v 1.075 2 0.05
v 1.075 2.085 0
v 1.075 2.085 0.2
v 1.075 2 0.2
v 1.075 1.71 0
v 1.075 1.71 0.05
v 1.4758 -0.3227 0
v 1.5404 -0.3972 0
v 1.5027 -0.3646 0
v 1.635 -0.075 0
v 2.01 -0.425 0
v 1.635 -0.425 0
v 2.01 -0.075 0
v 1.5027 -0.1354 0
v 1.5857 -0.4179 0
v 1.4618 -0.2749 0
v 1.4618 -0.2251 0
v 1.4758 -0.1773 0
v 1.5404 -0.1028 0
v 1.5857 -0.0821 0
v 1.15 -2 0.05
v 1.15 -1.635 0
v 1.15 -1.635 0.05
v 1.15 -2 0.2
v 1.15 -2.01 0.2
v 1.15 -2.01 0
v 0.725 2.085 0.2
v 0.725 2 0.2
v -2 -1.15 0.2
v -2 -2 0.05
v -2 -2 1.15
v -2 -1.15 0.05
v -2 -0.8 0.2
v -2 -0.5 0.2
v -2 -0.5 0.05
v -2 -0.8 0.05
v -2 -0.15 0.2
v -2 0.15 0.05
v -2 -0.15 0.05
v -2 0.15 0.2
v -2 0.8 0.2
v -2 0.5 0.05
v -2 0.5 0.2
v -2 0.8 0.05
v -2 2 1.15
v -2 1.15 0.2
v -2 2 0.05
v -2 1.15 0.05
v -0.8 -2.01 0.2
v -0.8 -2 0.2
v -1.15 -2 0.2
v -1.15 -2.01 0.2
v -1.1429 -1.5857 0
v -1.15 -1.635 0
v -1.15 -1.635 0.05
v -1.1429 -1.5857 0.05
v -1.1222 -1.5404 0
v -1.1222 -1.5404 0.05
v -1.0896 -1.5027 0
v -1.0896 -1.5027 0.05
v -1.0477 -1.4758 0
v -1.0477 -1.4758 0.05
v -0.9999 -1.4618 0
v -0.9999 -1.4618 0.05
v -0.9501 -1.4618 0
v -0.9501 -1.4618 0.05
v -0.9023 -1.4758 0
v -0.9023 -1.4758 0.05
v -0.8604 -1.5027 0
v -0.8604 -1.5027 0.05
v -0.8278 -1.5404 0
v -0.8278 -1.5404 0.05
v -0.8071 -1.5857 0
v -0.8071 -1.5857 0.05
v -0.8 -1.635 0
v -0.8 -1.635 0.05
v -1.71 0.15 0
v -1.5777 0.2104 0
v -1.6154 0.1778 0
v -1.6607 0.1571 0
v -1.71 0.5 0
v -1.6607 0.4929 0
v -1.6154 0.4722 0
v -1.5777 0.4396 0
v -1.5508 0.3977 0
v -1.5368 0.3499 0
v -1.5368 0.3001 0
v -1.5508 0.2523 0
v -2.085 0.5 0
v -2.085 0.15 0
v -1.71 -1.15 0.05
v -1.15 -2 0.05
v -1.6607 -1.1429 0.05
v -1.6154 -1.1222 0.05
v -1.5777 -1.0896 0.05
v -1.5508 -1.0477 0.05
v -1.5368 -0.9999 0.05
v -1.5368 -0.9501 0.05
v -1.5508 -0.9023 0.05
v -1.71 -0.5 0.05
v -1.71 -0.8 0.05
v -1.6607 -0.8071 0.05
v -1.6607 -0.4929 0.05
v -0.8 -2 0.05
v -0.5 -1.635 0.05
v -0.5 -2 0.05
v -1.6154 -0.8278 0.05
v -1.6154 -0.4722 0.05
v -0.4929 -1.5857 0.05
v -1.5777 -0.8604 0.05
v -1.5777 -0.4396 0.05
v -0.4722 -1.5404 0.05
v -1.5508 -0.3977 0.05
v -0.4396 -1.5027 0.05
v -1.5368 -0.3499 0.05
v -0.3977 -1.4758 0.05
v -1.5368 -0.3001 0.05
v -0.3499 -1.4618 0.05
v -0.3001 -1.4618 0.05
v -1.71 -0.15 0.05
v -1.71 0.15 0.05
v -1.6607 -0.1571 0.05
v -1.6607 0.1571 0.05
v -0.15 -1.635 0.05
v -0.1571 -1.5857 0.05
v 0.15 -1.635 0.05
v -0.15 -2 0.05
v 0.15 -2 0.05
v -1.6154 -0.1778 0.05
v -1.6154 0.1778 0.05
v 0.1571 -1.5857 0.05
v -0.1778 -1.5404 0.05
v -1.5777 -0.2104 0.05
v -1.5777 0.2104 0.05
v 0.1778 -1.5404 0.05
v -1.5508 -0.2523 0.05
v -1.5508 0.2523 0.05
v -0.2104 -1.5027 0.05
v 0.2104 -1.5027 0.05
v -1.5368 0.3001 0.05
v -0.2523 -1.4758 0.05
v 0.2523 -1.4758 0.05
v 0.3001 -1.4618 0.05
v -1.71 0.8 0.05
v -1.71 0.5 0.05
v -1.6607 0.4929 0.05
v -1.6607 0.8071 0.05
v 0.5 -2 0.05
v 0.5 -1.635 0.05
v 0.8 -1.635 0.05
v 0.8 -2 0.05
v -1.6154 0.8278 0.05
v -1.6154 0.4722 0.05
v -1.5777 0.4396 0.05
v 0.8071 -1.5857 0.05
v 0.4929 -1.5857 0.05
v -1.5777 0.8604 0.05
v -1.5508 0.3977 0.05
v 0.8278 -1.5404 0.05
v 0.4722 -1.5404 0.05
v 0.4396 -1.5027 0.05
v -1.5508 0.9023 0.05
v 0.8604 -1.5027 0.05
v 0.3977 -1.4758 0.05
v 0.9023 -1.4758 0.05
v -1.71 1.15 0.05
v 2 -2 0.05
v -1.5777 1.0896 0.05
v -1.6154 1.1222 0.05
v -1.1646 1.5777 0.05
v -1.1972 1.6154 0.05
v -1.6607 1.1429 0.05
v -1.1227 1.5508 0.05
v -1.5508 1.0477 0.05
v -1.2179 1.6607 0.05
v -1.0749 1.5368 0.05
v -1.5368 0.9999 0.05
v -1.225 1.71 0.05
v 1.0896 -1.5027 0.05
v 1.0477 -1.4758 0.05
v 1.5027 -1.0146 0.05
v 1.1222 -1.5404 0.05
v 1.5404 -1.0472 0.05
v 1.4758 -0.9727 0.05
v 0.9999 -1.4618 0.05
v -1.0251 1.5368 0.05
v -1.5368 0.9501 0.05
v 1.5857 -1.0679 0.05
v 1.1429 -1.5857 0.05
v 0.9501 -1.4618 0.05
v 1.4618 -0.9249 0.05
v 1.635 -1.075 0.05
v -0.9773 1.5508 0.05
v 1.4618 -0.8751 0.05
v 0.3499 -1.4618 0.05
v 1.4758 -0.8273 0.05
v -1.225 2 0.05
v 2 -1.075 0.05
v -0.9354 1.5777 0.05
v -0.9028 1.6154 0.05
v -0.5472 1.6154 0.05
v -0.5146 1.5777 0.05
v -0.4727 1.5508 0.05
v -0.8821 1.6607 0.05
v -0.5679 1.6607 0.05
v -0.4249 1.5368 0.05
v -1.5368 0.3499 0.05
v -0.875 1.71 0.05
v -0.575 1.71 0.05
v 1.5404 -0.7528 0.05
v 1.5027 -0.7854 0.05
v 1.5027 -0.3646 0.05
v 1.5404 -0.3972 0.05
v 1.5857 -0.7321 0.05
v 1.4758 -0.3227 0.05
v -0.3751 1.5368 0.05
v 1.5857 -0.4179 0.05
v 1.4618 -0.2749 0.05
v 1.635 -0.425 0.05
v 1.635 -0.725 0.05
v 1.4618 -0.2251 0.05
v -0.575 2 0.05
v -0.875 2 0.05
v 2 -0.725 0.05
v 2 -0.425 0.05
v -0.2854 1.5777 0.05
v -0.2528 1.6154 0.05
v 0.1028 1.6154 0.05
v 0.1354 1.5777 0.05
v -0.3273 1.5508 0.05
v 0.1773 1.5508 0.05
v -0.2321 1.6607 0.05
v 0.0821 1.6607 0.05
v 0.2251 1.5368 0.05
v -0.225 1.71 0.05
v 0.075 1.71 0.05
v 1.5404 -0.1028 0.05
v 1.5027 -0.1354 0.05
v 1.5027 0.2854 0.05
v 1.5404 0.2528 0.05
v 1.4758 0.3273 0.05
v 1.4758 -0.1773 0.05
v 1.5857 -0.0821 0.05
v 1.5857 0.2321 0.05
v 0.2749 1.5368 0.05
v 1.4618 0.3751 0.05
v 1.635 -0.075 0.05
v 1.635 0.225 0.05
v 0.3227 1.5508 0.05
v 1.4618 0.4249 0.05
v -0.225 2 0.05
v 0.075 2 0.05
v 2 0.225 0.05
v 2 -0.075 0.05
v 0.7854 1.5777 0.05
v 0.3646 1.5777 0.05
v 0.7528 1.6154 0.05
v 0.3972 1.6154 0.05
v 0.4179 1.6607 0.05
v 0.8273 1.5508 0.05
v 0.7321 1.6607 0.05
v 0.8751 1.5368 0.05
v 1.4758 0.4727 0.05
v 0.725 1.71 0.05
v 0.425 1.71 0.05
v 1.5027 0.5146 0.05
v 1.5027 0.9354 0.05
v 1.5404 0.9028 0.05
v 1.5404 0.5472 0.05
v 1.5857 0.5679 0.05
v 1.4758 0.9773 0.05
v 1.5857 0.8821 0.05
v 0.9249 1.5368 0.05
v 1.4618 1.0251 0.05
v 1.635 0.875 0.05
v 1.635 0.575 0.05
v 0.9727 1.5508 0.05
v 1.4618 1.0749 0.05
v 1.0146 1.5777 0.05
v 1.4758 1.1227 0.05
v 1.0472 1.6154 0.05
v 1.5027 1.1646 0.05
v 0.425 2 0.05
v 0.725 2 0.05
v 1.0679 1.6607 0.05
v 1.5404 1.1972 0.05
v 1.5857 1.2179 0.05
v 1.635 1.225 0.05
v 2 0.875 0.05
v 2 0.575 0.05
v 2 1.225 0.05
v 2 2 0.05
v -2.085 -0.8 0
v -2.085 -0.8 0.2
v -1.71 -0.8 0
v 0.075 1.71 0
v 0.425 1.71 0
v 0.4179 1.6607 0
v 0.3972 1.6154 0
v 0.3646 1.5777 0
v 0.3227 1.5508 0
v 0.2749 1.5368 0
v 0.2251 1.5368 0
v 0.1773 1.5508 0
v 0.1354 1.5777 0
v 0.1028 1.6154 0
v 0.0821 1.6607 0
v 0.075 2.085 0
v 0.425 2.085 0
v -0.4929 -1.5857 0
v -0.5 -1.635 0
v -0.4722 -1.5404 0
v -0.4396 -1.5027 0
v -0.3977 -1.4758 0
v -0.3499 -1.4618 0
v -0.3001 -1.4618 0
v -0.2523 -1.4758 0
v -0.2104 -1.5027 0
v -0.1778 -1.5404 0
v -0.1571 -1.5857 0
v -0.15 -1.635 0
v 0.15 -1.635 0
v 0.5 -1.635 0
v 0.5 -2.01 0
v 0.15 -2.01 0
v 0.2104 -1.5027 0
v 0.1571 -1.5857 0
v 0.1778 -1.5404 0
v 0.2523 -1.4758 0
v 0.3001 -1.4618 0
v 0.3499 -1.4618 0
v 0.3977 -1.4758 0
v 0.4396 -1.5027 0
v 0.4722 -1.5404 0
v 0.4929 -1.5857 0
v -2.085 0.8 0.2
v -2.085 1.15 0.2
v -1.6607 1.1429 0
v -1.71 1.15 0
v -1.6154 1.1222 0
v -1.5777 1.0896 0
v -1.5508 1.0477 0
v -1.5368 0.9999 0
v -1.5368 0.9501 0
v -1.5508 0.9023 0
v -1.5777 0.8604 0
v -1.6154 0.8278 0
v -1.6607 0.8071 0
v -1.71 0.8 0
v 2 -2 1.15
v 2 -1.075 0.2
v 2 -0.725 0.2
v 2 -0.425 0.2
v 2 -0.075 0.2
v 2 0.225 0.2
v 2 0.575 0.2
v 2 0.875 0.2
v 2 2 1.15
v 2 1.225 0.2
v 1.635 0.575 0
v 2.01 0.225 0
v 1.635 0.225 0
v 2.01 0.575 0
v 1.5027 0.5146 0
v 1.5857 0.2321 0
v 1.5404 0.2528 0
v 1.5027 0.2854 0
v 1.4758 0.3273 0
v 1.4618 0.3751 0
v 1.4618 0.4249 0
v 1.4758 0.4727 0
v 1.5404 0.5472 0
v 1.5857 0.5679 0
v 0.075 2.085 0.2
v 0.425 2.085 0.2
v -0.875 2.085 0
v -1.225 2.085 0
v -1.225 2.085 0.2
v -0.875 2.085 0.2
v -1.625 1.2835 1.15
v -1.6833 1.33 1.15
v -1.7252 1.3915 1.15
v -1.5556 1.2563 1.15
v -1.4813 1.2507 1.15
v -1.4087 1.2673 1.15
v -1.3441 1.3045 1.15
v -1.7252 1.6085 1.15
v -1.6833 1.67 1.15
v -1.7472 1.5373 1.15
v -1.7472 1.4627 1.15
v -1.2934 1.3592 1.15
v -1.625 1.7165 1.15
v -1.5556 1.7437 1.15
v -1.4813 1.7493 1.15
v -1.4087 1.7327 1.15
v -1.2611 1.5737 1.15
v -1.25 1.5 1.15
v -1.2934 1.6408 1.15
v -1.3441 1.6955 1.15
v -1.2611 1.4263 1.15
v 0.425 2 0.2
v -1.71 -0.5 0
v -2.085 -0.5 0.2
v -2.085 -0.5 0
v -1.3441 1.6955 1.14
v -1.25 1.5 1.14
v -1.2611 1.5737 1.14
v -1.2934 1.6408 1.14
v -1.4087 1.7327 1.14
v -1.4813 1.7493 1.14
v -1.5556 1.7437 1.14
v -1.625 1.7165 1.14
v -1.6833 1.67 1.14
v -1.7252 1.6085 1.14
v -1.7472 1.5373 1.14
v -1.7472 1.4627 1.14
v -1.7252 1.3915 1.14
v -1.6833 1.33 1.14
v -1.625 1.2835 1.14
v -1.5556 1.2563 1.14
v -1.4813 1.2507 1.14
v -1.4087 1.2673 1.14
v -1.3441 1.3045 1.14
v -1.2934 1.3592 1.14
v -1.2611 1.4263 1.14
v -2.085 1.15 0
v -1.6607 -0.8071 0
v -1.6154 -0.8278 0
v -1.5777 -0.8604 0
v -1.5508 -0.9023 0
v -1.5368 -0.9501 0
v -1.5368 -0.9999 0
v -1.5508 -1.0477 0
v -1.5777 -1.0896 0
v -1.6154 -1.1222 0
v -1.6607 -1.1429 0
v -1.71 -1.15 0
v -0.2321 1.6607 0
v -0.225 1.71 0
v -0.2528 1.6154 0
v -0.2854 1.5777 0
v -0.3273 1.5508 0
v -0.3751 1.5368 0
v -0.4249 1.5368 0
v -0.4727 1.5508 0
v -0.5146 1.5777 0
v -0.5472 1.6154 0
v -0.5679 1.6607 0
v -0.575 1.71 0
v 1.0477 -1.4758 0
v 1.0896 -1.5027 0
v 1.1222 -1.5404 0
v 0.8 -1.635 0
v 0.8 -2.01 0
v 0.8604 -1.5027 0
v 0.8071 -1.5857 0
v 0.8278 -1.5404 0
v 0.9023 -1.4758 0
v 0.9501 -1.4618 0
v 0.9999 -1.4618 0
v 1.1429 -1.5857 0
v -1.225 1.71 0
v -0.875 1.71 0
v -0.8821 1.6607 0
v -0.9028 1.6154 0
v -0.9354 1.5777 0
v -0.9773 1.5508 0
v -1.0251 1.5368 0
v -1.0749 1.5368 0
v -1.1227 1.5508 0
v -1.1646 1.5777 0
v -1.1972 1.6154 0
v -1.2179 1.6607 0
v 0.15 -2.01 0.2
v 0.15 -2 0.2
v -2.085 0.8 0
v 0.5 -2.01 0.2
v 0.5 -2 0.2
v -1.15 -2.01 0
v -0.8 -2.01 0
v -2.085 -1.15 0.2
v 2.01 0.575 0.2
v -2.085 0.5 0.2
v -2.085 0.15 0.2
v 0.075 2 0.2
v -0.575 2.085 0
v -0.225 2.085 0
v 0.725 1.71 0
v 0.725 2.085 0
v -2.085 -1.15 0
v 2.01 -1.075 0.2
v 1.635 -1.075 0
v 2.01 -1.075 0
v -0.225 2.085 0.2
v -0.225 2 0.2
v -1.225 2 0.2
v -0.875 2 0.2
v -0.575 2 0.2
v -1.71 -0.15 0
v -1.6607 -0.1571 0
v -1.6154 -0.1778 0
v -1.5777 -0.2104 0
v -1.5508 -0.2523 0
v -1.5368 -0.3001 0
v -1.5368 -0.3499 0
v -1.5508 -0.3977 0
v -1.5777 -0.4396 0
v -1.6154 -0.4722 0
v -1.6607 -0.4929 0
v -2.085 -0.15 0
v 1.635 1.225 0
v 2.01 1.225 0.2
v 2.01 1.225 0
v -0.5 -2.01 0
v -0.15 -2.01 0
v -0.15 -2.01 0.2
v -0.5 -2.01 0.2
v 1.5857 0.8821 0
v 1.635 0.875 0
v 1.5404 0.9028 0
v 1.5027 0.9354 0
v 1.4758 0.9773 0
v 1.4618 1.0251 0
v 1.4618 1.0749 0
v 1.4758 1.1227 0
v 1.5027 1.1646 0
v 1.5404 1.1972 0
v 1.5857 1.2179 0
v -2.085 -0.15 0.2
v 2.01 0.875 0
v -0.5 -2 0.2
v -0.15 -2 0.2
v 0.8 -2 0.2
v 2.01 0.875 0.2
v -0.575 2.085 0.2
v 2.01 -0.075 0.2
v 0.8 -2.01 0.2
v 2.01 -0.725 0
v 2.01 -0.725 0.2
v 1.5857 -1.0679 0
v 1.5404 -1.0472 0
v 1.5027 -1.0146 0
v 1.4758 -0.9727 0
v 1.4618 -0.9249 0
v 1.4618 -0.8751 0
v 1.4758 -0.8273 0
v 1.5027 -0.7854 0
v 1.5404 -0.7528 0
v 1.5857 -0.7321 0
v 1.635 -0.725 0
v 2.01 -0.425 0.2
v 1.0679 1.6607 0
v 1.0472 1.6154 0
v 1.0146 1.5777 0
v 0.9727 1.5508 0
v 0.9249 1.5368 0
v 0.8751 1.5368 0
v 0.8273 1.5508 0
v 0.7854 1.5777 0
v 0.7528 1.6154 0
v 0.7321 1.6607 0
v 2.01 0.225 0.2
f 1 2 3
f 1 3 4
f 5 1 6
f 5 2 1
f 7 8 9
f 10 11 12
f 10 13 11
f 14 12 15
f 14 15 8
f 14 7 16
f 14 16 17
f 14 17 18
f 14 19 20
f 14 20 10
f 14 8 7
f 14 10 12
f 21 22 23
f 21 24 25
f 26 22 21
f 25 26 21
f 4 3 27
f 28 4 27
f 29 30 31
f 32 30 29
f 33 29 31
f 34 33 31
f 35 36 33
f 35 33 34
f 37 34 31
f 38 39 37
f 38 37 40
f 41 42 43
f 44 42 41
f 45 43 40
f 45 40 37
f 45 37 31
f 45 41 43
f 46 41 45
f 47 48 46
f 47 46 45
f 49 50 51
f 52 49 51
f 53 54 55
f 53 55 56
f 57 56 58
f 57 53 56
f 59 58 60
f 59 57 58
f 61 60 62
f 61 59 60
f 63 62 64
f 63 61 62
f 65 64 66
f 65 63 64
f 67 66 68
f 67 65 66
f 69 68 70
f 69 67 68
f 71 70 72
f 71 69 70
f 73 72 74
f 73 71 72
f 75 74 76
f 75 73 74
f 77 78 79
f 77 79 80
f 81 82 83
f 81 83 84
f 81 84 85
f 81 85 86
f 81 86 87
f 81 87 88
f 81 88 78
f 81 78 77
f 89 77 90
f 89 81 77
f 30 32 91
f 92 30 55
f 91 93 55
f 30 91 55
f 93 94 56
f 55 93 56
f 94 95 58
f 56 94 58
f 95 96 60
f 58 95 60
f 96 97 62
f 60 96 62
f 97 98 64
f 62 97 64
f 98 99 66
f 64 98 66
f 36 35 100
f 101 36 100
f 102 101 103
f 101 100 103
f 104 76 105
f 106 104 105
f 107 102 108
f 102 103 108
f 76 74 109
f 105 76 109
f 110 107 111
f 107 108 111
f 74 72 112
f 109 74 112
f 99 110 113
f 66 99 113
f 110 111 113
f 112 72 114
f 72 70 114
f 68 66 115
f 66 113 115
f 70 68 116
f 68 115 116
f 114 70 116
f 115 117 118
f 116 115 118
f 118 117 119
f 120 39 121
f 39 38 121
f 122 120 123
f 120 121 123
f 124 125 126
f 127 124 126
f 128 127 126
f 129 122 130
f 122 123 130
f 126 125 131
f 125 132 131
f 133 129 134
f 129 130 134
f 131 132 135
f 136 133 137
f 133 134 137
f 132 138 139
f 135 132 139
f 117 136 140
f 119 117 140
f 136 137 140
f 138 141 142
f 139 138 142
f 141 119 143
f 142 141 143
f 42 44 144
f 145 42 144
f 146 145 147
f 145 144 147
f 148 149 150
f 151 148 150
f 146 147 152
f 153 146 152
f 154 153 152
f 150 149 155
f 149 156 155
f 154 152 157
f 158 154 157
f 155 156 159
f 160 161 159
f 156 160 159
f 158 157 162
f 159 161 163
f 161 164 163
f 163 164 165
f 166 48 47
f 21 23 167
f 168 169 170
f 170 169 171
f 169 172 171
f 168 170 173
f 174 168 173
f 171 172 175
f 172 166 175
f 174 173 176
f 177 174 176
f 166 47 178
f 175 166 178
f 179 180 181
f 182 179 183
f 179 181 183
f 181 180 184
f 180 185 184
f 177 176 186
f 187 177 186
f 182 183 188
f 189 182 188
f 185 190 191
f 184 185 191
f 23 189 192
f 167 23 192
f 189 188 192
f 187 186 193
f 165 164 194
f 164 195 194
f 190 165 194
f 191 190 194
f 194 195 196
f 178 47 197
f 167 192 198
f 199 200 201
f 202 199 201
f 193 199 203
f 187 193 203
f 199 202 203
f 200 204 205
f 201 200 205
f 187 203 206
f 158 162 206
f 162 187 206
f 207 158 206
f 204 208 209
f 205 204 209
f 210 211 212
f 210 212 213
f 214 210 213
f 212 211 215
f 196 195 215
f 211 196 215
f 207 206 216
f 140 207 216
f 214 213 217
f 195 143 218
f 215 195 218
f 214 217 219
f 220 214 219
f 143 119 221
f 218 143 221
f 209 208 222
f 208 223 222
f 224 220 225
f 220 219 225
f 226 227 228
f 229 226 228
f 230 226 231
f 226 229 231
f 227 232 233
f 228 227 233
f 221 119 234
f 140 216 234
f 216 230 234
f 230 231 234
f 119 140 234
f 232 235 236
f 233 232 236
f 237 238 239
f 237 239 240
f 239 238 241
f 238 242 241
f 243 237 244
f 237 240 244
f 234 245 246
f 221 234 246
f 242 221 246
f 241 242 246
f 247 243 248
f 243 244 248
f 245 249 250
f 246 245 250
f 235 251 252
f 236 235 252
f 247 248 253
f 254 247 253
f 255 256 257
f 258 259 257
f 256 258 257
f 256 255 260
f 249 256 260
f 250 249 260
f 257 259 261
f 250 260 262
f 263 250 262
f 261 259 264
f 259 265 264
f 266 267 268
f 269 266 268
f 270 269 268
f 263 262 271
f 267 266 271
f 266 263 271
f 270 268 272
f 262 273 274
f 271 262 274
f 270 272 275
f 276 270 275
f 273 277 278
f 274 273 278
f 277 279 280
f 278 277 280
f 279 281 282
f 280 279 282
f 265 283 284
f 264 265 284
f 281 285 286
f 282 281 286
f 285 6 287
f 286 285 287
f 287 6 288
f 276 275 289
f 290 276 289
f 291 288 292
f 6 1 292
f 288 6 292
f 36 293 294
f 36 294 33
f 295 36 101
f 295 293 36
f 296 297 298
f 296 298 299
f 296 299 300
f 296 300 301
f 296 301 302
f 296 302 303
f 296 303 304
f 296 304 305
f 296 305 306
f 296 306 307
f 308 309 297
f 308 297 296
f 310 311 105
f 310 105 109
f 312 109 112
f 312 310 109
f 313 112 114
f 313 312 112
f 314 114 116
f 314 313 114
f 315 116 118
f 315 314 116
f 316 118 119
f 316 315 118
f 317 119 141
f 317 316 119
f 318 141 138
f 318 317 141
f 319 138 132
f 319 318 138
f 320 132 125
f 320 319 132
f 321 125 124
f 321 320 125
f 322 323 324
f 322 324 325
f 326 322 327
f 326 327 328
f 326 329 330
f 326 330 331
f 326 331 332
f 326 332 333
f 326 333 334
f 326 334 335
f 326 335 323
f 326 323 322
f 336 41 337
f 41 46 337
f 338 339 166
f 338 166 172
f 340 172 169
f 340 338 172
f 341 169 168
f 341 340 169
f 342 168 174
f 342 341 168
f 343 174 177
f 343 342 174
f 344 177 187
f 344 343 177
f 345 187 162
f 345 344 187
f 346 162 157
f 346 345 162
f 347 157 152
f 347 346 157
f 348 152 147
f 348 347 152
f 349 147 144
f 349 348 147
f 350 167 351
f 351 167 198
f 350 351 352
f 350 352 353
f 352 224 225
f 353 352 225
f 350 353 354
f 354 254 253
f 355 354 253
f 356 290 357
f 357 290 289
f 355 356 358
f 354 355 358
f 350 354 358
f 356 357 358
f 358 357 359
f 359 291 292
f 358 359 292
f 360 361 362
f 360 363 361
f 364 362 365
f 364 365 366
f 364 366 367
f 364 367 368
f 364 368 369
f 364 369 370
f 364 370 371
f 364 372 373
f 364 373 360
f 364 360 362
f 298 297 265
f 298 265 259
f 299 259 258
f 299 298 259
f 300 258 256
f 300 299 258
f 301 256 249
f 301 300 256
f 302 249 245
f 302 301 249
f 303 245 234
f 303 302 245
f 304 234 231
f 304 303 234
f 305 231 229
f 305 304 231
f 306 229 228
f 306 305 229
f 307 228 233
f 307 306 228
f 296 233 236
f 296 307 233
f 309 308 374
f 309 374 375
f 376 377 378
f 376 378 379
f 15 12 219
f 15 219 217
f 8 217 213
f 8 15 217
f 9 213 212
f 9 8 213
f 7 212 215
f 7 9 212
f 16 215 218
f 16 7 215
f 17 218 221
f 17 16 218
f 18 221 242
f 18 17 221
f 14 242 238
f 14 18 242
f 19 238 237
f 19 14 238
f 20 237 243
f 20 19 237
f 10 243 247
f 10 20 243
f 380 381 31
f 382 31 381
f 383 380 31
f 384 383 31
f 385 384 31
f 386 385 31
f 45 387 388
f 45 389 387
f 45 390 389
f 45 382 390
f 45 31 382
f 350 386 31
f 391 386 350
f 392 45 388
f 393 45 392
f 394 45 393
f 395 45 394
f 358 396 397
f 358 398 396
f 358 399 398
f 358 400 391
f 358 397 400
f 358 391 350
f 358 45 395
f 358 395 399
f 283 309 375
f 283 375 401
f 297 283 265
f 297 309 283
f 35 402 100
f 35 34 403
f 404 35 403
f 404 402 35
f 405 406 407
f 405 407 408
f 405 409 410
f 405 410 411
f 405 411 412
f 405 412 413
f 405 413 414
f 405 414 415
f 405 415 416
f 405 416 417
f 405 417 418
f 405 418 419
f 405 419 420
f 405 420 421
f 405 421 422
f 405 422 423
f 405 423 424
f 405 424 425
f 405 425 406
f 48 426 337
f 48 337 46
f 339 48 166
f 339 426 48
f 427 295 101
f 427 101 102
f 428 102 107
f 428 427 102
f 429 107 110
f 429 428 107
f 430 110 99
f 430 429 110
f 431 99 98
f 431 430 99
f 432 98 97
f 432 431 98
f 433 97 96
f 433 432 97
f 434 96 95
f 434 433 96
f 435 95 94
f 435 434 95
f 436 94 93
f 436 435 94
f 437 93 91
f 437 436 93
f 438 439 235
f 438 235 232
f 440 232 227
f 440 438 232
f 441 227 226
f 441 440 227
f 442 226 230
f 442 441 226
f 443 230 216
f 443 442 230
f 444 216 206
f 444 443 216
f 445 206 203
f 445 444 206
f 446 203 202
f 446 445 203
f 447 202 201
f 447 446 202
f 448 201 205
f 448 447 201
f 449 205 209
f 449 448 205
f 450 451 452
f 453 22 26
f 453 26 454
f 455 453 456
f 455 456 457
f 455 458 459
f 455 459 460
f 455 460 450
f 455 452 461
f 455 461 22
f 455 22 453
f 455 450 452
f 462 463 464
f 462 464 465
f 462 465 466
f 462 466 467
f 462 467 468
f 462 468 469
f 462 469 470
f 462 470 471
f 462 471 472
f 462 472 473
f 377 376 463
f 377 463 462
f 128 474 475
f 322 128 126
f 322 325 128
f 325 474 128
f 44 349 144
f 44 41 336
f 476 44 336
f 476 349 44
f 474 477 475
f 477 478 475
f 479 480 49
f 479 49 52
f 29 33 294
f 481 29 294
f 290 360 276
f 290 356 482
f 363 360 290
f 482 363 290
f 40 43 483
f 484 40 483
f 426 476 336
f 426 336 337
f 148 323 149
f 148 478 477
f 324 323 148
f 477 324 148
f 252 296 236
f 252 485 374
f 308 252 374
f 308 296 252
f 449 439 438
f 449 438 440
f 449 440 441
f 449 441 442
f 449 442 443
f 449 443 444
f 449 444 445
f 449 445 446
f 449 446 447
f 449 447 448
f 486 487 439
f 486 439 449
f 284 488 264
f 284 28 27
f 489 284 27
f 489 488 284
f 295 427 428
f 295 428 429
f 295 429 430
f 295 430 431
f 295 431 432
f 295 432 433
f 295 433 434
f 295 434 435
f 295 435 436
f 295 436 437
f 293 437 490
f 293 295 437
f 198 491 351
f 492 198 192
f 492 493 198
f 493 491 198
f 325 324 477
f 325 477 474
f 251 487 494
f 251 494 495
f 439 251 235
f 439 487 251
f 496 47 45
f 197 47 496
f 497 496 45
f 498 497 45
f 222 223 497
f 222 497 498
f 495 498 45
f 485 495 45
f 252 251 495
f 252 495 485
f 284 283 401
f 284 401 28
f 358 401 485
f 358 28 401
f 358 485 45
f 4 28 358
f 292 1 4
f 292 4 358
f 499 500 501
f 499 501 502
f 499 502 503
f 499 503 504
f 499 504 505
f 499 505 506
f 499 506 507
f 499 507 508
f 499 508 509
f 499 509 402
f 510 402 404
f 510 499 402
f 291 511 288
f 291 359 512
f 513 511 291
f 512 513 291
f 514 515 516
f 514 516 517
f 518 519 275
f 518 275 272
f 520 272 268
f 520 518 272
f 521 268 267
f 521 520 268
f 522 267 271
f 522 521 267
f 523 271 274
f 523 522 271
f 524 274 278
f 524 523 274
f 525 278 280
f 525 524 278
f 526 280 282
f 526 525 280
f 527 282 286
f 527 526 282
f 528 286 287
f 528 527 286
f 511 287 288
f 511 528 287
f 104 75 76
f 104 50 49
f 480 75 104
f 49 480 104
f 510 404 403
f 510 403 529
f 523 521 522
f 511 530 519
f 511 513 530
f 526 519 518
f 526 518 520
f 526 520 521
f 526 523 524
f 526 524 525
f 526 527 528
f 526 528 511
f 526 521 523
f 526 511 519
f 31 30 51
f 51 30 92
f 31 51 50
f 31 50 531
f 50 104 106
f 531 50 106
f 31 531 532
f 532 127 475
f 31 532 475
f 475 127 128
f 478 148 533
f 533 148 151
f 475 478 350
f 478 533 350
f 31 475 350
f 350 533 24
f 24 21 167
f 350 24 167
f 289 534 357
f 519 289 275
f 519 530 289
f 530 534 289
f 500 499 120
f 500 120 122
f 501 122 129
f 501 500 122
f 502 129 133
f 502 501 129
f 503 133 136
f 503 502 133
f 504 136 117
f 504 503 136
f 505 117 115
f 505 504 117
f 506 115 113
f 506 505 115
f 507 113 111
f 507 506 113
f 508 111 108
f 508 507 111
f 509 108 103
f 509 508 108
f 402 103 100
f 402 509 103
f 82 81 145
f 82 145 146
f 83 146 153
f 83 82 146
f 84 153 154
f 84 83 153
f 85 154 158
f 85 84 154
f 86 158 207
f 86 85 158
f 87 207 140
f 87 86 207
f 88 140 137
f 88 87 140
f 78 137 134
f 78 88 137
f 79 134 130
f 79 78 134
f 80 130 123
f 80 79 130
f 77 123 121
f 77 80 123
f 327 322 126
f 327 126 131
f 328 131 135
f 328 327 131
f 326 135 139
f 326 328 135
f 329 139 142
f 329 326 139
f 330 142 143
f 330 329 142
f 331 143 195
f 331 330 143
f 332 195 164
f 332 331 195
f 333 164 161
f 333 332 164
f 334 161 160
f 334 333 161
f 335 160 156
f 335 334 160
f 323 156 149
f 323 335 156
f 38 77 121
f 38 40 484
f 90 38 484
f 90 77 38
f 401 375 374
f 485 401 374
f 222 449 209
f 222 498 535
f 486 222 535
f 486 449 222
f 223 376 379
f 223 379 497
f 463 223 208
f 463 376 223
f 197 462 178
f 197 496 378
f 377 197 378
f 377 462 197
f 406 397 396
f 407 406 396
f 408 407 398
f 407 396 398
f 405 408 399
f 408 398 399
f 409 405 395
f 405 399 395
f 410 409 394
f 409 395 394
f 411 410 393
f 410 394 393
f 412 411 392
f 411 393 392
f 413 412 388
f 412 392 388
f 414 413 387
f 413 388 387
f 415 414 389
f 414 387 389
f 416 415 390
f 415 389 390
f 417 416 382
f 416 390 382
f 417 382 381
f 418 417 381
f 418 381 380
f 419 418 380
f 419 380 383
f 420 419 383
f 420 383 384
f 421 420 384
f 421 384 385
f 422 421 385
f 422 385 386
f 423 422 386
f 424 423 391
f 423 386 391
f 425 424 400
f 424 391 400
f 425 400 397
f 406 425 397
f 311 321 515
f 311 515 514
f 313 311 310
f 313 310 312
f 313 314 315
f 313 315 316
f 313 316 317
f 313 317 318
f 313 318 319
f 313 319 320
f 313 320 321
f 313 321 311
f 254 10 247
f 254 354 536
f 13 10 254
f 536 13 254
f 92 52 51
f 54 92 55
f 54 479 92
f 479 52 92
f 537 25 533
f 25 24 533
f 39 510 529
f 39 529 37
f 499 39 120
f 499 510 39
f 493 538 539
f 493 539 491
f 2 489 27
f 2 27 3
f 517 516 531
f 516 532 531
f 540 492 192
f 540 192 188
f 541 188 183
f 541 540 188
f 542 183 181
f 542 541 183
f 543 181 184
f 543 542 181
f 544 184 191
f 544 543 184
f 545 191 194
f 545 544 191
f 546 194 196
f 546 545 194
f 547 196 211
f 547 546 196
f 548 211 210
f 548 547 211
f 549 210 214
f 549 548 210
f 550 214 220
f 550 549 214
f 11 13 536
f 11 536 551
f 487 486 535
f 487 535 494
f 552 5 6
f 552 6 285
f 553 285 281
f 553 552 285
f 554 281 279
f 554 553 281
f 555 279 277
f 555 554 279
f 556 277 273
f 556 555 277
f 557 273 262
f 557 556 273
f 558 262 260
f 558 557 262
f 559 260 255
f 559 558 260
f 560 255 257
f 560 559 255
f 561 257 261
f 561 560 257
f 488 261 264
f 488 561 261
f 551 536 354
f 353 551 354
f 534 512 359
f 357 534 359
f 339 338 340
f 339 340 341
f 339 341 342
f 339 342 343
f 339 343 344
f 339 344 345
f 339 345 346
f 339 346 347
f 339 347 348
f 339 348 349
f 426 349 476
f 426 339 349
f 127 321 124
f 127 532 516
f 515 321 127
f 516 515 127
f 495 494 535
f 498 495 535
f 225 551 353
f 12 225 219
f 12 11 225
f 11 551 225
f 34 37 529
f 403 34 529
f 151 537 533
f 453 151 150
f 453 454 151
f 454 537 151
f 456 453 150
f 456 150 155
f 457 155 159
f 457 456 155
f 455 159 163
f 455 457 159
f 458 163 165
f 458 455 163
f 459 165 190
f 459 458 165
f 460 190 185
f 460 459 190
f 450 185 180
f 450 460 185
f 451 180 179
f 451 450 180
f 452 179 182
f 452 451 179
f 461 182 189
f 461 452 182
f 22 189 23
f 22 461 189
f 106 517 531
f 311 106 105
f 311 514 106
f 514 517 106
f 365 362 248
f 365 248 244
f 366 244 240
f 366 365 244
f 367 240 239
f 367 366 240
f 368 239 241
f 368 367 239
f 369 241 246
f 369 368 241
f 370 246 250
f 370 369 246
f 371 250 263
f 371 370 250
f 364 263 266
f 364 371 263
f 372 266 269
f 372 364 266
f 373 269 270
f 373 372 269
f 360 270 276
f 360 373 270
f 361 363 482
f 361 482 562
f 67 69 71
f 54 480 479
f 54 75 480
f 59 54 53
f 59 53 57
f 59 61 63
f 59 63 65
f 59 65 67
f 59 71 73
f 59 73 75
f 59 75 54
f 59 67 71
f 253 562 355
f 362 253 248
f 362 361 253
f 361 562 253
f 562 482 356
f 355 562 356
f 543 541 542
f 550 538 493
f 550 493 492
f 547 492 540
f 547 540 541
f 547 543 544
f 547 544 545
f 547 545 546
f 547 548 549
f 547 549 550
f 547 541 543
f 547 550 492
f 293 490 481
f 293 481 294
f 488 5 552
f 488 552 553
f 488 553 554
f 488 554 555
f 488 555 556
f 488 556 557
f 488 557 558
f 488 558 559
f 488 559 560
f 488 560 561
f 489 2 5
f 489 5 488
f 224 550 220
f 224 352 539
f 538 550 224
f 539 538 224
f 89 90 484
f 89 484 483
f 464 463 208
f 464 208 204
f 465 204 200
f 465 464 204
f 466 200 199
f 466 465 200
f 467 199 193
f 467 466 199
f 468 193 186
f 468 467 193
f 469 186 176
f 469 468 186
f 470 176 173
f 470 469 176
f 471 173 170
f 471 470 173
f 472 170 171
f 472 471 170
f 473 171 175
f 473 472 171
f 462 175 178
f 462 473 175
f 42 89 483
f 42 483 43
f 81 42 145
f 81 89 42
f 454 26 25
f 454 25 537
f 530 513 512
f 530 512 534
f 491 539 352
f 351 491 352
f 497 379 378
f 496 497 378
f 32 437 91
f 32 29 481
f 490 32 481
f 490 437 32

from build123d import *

# Parameters (mm, degrees)
ESBO_O1_W                = 4
ESBO_O1_H                = 4
RESSALTO_EXTRUS_O1_DEPTH = 1.1
RESSALTO_EXTRUS_O2_DEPTH = 0.2
ESBO_O3_R                = 0.25
CORTE_EXTRUS_O1_DEPTH    = 0.01


with BuildPart() as part:
    # Esboço1 → Ressalto-extrusão1 (new body)
    with BuildSketch(Plane.XY.offset(0.05)):
        Rectangle(ESBO_O1_W, ESBO_O1_H)
    extrude(amount=RESSALTO_EXTRUS_O1_DEPTH)

    # Esboço2 → Ressalto-extrusão2 (add)
    with BuildSketch(Plane.XY):
        with BuildLine():
            Line((-0.8, -2.01), (-1.15, -2.01))
            Line((-1.15, -2.01), (-1.15, -1.635))
            ThreePointArc((-1.15, -1.635), (-0.975, -1.46), (-0.8, -1.635))
            Line((-0.8, -1.635), (-0.8, -2.01))
        make_face()
        with BuildLine():
            Line((-0.5, -2.01), (-0.5, -1.635))
            ThreePointArc((-0.5, -1.635), (-0.325, -1.46), (-0.15, -1.635))
            Line((-0.15, -1.635), (-0.15, -2.01))
            Line((-0.15, -2.01), (-0.5, -2.01))
        make_face()
        with BuildLine():
            Line((0.15, -2.01), (0.15, -1.635))
            ThreePointArc((0.15, -1.635), (0.325, -1.46), (0.5, -1.635))
            Line((0.5, -1.635), (0.5, -2.01))
            Line((0.5, -2.01), (0.15, -2.01))
        make_face()
        with BuildLine():
            Line((0.8, -2.01), (0.8, -1.635))
            ThreePointArc((0.8, -1.635), (0.975, -1.46), (1.15, -1.635))
            Line((1.15, -1.635), (1.15, -2.01))
            Line((1.15, -2.01), (0.8, -2.01))
        make_face()
        with BuildLine():
            Line((-2.085, 0.8), (-2.085, 1.15))
            Line((-2.085, 1.15), (-1.71, 1.15))
            ThreePointArc((-1.71, 1.15), (-1.535, 0.975), (-1.71, 0.8))
            Line((-1.71, 0.8), (-2.085, 0.8))
        make_face()
        with BuildLine():
            Line((-2.085, 0.5), (-1.71, 0.5))
            ThreePointArc((-1.71, 0.5), (-1.535, 0.325), (-1.71, 0.15))
            Line((-1.71, 0.15), (-2.085, 0.15))
            Line((-2.085, 0.15), (-2.085, 0.5))
        make_face()
        with BuildLine():
            Line((-2.085, -0.15), (-1.71, -0.15))
            ThreePointArc((-1.71, -0.15), (-1.535, -0.325), (-1.71, -0.5))
            Line((-1.71, -0.5), (-2.085, -0.5))
            Line((-2.085, -0.5), (-2.085, -0.15))
        make_face()
        with BuildLine():
            Line((-2.085, -0.8), (-1.71, -0.8))
            ThreePointArc((-1.71, -0.8), (-1.535, -0.975), (-1.71, -1.15))
            Line((-1.71, -1.15), (-2.085, -1.15))
            Line((-2.085, -1.15), (-2.085, -0.8))
        make_face()
        with BuildLine():
            Line((0.725, 2.085), (1.075, 2.085))
            Line((1.075, 2.085), (1.075, 1.71))
            ThreePointArc((1.075, 1.71), (0.9, 1.535), (0.725, 1.71))
            Line((0.725, 1.71), (0.725, 2.085))
        make_face()
        with BuildLine():
            Line((0.425, 2.085), (0.425, 1.71))
            ThreePointArc((0.425, 1.71), (0.25, 1.535), (0.075, 1.71))
            Line((0.075, 1.71), (0.075, 2.085))
            Line((0.075, 2.085), (0.425, 2.085))
        make_face()
        with BuildLine():
            Line((-0.225, 2.085), (-0.225, 1.71))
            ThreePointArc((-0.225, 1.71), (-0.4, 1.535), (-0.575, 1.71))
            Line((-0.575, 1.71), (-0.575, 2.085))
            Line((-0.575, 2.085), (-0.225, 2.085))
        make_face()
        with BuildLine():
            Line((-0.875, 2.085), (-0.875, 1.71))
            ThreePointArc((-0.875, 1.71), (-1.05, 1.535), (-1.225, 1.71))
            Line((-1.225, 1.71), (-1.225, 2.085))
            Line((-1.225, 2.085), (-0.875, 2.085))
        make_face()
        with BuildLine():
            Line((2.01, -0.725), (2.01, -1.075))
            Line((2.01, -1.075), (1.635, -1.075))
            ThreePointArc((1.635, -1.075), (1.46, -0.9), (1.635, -0.725))
            Line((1.635, -0.725), (2.01, -0.725))
        make_face()
        with BuildLine():
            Line((2.01, -0.425), (1.635, -0.425))
            ThreePointArc((1.635, -0.425), (1.46, -0.25), (1.635, -0.075))
            Line((1.635, -0.075), (2.01, -0.075))
            Line((2.01, -0.075), (2.01, -0.425))
        make_face()
        with BuildLine():
            Line((2.01, 0.225), (1.635, 0.225))
            ThreePointArc((1.635, 0.225), (1.46, 0.4), (1.635, 0.575))
            Line((1.635, 0.575), (2.01, 0.575))
            Line((2.01, 0.575), (2.01, 0.225))
        make_face()
        with BuildLine():
            Line((2.01, 0.875), (1.635, 0.875))
            ThreePointArc((1.635, 0.875), (1.46, 1.05), (1.635, 1.225))
            Line((1.635, 1.225), (2.01, 1.225))
            Line((2.01, 1.225), (2.01, 0.875))
        make_face()
    extrude(amount=RESSALTO_EXTRUS_O2_DEPTH)

    # Esboço3 → Corte-extrusão1 (cut)
    with BuildSketch(Plane.XY.offset(1.15)):
        with Locations((-1.5, 1.5)):
            Circle(ESBO_O3_R)
    extrude(amount=-CORTE_EXTRUS_O1_DEPTH, mode=Mode.SUBTRACT)


solid = part.part
